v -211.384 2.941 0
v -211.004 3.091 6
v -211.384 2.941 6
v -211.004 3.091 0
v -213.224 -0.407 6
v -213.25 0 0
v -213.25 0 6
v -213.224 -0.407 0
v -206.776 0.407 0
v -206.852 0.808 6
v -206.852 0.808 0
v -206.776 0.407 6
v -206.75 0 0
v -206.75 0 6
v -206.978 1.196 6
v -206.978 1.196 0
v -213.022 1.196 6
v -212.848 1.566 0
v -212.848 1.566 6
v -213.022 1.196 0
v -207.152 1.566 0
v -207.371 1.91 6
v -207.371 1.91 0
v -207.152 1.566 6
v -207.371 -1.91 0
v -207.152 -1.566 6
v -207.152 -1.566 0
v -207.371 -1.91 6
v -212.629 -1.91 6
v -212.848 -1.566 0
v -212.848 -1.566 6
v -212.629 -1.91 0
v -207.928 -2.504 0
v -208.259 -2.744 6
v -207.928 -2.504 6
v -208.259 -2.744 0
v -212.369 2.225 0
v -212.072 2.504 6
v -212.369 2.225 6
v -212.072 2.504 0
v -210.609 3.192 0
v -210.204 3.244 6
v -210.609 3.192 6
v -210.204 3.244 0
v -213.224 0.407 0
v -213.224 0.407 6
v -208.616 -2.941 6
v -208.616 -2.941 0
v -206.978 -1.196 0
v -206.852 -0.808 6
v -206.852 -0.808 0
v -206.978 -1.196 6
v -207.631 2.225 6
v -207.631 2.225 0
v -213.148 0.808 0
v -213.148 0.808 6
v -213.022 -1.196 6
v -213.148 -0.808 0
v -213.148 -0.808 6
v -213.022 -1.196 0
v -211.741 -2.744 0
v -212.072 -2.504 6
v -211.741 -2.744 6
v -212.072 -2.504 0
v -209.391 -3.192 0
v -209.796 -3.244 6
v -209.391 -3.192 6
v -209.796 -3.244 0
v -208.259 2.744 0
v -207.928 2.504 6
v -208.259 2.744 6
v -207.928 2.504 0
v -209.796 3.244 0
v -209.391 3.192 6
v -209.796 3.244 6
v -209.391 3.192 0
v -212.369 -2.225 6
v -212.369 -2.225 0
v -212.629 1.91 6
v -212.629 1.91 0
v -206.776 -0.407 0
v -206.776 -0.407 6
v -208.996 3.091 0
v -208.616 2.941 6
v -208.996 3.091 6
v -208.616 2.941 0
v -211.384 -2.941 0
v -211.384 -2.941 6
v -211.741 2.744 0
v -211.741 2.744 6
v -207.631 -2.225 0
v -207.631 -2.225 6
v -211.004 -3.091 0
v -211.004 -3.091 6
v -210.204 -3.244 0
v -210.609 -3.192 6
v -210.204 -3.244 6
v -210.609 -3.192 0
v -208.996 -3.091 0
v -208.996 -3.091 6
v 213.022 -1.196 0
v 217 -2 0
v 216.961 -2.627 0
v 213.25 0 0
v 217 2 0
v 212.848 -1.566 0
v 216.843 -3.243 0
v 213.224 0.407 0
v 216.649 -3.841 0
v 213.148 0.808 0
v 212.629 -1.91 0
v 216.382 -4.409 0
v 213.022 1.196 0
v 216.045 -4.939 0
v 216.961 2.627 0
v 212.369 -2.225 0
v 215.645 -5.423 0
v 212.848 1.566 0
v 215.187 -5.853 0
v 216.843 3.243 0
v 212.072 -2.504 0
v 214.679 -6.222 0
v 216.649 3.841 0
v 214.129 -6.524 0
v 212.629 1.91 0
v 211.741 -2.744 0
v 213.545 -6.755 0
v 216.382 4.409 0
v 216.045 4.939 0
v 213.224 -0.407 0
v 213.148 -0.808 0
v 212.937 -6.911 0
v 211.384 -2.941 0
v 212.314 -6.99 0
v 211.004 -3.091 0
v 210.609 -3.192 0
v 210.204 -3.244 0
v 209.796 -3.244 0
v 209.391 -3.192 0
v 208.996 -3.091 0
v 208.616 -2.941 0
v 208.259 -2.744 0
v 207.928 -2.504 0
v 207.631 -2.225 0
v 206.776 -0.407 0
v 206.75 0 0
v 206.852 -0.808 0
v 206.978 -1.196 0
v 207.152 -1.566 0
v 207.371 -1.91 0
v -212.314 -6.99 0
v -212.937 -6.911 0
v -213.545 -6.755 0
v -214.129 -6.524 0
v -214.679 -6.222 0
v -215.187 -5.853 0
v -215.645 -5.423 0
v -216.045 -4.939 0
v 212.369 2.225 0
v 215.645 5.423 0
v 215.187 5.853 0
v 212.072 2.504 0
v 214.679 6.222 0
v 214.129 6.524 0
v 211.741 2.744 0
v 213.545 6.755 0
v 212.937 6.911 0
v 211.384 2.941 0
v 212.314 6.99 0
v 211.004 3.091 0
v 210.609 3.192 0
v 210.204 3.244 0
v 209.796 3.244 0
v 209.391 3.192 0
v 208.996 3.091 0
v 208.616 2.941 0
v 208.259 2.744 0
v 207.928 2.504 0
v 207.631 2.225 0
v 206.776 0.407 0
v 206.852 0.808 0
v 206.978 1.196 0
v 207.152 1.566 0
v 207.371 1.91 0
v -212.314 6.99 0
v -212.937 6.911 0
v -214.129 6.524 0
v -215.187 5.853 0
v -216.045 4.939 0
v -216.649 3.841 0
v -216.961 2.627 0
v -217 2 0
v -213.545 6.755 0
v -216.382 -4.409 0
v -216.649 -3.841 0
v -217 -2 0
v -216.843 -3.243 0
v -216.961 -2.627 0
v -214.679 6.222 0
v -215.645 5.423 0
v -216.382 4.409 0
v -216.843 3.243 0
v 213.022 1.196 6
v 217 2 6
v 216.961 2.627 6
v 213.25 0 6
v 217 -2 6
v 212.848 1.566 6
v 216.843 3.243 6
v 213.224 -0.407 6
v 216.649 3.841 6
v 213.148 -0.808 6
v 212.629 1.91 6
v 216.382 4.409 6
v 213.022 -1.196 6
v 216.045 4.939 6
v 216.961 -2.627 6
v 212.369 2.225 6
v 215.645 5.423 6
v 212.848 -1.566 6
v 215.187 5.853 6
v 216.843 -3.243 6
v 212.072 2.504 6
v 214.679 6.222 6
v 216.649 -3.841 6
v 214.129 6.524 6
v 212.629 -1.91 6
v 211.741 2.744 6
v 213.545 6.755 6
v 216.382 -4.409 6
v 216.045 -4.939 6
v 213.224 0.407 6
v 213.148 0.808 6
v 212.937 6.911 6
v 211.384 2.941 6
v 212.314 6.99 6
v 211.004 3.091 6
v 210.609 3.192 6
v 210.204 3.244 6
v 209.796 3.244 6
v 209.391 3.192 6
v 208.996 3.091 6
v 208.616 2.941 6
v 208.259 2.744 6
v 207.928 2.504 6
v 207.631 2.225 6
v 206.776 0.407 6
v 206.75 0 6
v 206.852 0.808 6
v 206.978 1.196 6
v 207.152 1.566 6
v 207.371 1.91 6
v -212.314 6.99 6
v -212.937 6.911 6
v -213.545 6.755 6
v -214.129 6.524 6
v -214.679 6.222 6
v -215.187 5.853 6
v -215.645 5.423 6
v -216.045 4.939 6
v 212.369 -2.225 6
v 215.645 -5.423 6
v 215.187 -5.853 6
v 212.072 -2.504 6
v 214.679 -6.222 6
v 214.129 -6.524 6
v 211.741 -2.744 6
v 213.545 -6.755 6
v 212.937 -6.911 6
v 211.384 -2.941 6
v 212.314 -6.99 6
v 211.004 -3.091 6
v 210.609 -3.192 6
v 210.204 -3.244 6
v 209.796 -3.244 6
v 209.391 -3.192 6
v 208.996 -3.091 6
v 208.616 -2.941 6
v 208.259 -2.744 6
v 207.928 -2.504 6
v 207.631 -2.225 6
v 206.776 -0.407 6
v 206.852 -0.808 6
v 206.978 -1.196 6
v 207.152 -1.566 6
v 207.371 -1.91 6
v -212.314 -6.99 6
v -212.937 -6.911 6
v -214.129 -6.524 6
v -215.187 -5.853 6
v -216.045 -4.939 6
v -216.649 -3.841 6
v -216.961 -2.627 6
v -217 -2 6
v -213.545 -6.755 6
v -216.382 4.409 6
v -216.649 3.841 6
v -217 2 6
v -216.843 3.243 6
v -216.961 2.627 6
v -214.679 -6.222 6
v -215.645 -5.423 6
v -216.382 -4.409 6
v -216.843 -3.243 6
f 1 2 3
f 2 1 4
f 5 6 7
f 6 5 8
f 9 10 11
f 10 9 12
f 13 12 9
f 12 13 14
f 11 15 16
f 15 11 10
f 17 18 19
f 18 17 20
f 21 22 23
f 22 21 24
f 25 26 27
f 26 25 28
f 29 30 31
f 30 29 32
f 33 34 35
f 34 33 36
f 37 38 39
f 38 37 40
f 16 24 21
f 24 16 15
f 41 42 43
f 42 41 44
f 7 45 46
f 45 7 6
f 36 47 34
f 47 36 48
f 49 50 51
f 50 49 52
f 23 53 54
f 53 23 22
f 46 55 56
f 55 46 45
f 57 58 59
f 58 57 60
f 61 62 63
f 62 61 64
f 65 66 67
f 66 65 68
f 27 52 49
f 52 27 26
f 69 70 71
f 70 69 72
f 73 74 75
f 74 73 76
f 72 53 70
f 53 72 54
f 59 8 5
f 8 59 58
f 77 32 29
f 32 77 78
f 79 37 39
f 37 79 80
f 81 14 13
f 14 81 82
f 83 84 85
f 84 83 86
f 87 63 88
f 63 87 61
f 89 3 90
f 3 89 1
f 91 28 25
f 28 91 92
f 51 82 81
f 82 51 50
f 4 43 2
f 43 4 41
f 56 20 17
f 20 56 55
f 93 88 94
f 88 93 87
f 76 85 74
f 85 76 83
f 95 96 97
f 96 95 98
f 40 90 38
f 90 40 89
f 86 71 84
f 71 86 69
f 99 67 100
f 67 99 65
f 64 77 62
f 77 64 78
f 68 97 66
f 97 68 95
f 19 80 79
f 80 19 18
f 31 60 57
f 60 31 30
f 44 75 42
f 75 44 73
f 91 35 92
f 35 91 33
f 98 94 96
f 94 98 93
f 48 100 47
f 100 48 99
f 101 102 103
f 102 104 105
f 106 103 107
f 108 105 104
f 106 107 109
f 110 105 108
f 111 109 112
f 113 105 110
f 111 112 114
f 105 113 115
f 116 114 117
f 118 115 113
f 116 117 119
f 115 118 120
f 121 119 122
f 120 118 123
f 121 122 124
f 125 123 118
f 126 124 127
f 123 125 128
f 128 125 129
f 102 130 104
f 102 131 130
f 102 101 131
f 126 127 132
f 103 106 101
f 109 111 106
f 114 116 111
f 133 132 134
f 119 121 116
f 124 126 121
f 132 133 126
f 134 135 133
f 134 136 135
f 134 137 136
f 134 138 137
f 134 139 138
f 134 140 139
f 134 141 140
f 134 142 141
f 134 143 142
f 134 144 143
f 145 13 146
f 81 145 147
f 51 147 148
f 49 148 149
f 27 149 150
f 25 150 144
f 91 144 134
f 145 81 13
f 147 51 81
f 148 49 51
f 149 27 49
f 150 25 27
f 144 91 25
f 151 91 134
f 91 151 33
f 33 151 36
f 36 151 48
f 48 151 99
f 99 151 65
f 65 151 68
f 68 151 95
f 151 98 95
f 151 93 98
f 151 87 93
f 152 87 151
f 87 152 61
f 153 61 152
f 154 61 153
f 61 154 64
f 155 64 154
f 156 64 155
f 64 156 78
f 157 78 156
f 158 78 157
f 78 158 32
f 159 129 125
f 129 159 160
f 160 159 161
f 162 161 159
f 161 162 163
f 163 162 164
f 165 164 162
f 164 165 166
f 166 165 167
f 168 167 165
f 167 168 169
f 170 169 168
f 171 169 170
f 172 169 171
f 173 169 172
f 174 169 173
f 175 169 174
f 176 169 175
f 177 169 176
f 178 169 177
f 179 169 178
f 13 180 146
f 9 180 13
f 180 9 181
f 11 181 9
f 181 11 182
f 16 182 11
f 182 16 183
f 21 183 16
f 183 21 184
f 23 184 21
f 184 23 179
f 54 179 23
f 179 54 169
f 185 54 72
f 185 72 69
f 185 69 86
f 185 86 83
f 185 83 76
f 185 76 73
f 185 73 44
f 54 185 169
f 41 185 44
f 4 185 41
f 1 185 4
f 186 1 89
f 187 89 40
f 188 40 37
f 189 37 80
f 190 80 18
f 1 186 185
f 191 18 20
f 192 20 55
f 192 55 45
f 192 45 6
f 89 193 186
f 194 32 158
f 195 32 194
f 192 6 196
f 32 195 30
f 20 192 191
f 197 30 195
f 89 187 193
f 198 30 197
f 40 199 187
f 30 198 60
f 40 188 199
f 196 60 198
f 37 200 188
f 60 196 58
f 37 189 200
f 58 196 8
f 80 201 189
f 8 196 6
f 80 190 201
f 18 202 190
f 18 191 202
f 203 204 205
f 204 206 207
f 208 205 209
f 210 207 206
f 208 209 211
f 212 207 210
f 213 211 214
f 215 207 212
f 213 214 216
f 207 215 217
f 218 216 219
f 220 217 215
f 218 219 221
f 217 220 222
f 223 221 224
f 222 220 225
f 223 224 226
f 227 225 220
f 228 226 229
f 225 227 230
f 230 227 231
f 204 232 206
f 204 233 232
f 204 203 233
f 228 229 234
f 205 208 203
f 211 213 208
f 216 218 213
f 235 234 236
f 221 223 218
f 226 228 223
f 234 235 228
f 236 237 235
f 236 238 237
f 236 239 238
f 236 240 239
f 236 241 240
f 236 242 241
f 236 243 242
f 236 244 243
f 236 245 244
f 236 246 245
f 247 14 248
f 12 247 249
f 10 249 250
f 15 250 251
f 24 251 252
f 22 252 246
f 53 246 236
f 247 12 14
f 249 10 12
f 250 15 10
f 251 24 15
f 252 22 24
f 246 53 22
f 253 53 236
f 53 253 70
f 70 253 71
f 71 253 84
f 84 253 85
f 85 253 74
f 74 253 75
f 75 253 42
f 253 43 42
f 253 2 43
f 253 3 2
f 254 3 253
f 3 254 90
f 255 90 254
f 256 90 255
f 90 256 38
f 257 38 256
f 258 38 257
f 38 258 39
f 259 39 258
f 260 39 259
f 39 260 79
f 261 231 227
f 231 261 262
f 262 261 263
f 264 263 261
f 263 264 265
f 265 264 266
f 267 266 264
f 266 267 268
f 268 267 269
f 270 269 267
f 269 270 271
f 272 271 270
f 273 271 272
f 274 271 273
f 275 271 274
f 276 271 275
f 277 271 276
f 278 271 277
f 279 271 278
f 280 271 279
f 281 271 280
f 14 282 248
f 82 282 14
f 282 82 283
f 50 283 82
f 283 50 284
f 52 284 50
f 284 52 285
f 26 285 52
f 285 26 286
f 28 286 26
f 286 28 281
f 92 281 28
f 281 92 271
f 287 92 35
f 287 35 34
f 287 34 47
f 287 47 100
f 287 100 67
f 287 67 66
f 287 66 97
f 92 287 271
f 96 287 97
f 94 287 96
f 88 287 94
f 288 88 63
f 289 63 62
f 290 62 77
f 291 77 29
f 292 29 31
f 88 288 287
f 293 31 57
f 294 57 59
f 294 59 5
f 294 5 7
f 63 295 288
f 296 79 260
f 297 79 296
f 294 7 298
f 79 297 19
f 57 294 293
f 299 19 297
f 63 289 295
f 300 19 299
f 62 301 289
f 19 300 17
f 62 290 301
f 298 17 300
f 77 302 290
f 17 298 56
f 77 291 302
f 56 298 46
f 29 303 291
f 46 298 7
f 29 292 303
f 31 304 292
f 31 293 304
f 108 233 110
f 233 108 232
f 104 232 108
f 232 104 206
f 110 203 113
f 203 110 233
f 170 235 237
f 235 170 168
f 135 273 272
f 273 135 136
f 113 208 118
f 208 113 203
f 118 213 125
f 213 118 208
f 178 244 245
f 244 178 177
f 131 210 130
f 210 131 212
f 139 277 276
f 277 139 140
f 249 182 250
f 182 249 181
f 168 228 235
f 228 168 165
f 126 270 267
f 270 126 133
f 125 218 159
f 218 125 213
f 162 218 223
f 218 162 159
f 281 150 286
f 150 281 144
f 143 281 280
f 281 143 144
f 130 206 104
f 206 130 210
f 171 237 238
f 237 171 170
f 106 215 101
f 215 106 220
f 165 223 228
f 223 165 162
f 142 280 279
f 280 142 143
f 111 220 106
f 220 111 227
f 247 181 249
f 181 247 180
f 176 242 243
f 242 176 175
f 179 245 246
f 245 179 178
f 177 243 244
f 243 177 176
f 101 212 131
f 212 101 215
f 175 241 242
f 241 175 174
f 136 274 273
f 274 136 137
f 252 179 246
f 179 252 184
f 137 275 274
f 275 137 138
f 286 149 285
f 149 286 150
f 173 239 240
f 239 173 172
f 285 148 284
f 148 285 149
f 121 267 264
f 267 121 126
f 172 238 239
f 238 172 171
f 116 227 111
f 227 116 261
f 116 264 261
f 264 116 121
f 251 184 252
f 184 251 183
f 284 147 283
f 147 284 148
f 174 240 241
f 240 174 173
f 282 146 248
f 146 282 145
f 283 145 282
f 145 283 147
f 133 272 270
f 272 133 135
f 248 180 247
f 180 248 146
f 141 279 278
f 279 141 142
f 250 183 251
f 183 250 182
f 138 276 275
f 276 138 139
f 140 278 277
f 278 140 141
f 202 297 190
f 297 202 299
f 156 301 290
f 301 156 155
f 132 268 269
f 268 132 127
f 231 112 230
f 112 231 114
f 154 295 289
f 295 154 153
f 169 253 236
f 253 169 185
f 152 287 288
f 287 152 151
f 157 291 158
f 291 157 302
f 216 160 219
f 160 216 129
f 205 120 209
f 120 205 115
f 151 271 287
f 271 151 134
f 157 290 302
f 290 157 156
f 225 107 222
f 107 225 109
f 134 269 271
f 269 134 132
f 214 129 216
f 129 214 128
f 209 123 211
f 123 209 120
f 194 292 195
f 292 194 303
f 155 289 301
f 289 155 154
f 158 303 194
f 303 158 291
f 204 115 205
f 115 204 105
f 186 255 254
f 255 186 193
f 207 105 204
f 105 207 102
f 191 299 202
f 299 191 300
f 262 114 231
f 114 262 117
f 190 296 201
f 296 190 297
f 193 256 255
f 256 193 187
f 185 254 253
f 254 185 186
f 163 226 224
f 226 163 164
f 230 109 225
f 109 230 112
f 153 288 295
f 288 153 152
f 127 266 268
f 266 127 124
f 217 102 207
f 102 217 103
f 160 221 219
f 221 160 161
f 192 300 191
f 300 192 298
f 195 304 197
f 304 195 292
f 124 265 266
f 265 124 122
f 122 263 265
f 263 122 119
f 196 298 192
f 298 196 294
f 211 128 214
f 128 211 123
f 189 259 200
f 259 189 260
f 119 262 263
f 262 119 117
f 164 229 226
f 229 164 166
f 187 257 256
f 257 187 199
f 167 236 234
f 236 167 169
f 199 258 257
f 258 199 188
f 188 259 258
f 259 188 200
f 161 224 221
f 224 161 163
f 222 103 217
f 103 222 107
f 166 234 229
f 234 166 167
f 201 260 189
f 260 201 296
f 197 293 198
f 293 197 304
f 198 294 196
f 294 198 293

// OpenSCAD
$fn = 50;


difference() {
	union() {
		hull() {
			translate(v = [-212.0000000000, 2.0000000000, 0]) {
				cylinder(h = 6, r = 5);
			}
			translate(v = [212.0000000000, 2.0000000000, 0]) {
				cylinder(h = 6, r = 5);
			}
			translate(v = [-212.0000000000, -2.0000000000, 0]) {
				cylinder(h = 6, r = 5);
			}
			translate(v = [212.0000000000, -2.0000000000, 0]) {
				cylinder(h = 6, r = 5);
			}
		}
	}
	union() {
		translate(v = [-210.0000000000, 0.0000000000, 0]) {
			cylinder(h = 6, r = 3.2500000000);
		}
		translate(v = [210.0000000000, 0.0000000000, 0]) {
			cylinder(h = 6, r = 3.2500000000);
		}
		translate(v = [-210.0000000000, 0.0000000000, 0]) {
			cylinder(h = 6, r = 1.8000000000);
		}
		translate(v = [210.0000000000, 0.0000000000, 0]) {
			cylinder(h = 6, r = 1.8000000000);
		}
		translate(v = [-210.0000000000, 0.0000000000, 0]) {
			cylinder(h = 6, r = 1.8000000000);
		}
		translate(v = [210.0000000000, 0.0000000000, 0]) {
			cylinder(h = 6, r = 1.8000000000);
		}
		translate(v = [-210.0000000000, 0.0000000000, 0]) {
			cylinder(h = 6, r = 1.8000000000);
		}
		translate(v = [210.0000000000, 0.0000000000, 0]) {
			cylinder(h = 6, r = 1.8000000000);
		}
	}
}
